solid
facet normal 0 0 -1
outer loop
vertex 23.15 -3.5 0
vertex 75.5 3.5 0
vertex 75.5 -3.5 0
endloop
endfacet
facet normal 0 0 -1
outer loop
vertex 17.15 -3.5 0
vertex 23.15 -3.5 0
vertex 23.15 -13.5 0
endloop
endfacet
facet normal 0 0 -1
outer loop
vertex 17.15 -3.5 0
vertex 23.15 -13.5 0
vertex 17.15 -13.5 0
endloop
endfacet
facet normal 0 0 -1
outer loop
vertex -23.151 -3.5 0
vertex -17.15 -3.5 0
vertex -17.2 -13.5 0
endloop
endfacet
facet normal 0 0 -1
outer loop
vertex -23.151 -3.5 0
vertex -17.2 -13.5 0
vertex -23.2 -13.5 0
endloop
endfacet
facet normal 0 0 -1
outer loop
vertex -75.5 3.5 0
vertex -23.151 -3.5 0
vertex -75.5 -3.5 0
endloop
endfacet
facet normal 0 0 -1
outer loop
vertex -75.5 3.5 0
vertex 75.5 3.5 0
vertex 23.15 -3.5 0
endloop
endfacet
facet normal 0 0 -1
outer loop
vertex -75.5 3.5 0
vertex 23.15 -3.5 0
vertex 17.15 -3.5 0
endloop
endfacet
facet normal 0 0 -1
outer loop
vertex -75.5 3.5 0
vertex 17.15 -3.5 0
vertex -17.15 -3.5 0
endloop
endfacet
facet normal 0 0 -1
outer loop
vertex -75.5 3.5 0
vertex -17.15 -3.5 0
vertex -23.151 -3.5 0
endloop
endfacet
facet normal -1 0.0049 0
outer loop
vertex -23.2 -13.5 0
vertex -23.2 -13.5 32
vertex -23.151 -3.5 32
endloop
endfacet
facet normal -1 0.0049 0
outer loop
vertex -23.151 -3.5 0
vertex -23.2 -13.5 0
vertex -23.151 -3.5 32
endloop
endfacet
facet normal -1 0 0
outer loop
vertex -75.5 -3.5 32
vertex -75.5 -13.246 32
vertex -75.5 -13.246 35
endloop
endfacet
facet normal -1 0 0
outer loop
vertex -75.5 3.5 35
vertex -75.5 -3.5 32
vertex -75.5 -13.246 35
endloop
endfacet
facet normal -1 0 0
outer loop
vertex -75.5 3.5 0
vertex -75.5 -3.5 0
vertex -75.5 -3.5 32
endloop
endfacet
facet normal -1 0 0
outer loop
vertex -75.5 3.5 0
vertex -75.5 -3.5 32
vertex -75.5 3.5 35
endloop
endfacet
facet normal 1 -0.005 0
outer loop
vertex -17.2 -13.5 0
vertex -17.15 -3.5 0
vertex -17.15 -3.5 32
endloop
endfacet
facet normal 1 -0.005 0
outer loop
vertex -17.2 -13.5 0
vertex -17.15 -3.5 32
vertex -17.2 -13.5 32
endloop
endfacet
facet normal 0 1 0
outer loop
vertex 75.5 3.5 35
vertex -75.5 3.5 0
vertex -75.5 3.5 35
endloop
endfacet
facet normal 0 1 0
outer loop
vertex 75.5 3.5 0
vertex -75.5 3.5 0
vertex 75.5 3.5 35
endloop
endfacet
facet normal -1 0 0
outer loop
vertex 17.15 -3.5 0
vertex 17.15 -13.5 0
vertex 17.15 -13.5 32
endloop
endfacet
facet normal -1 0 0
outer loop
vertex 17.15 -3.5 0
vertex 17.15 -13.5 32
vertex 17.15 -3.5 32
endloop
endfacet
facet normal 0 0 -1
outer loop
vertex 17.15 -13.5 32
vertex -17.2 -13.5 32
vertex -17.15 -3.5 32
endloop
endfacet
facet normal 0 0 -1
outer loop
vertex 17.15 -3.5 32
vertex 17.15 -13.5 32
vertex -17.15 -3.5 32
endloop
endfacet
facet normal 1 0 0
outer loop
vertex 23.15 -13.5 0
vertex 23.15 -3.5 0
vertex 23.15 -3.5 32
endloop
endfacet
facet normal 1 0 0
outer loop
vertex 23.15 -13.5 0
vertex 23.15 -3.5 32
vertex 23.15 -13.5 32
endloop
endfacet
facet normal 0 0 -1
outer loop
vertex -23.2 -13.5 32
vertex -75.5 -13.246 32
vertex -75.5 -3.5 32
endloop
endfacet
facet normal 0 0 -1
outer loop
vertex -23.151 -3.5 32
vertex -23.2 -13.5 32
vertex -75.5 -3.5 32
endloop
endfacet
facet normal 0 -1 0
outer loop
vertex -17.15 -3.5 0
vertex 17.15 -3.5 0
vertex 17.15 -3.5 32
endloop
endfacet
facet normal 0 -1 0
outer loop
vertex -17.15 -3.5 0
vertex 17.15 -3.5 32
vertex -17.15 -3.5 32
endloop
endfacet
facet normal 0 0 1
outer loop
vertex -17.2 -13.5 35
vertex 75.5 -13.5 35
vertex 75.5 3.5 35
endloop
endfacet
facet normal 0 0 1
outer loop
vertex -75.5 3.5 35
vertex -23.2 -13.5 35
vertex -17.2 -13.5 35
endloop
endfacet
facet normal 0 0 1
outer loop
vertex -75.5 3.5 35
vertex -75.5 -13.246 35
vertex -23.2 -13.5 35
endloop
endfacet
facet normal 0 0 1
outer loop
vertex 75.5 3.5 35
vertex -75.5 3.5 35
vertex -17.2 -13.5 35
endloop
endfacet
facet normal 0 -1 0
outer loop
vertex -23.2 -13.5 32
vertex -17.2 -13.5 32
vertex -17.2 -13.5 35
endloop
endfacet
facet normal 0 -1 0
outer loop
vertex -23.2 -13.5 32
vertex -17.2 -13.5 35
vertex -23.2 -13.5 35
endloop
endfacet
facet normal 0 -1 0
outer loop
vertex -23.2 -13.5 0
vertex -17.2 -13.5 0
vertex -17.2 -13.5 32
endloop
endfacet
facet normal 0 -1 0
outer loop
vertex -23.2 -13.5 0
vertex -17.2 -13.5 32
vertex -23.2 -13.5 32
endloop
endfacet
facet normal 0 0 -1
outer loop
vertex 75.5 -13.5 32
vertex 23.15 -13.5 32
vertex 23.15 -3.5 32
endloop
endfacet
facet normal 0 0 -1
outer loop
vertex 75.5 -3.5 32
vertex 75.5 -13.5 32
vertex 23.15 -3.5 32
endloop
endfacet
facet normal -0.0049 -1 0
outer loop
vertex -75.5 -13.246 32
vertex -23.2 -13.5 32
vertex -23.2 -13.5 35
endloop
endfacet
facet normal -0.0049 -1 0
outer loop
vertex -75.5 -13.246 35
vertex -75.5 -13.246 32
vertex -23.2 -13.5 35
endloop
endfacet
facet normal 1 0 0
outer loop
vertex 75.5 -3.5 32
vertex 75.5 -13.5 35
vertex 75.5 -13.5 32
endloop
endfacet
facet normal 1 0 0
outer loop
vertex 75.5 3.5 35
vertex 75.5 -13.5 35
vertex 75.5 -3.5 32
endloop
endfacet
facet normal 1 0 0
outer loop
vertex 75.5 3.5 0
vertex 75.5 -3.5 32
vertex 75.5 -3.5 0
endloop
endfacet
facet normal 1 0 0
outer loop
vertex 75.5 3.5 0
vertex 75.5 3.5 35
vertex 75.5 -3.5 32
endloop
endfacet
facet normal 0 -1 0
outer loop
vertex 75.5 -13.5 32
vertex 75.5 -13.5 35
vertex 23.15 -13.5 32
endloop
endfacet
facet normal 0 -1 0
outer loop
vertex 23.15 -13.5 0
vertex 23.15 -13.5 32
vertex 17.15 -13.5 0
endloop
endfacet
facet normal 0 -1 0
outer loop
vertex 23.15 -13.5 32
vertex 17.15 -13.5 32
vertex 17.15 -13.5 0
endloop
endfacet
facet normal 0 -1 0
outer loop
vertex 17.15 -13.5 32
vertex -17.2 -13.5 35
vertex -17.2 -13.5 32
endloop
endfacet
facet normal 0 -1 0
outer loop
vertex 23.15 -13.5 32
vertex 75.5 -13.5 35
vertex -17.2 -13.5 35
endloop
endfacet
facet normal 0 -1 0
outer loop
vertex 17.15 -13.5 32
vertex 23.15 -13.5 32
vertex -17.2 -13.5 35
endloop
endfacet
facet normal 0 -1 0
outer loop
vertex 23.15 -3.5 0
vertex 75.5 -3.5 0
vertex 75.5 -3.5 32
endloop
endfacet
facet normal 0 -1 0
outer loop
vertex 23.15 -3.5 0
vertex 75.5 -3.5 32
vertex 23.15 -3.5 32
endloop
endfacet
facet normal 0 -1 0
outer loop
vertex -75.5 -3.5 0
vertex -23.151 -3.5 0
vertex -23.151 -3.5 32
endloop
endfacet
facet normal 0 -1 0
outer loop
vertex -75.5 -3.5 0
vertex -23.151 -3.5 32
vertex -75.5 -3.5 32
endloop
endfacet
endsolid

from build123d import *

# Parameters (mm, degrees)
BOSS_EXTRUDE1_DEPTH = 35
BOSS_EXTRUDE2_REACH = 94.65
SKETCH5_W           = 3
SKETCH5_H           = 10
BOSS_EXTRUDE3_REACH = 54.382
SKETCH6_W           = 3
SKETCH6_H           = 10.000117819
SKETCH7_W           = 3
SKETCH7_H           = 10
BOSS_EXTRUDE4_DEPTH = 52.35


with BuildPart() as part:
    # Sketch1 → Boss-Extrude1 (new body)
    with BuildSketch(Plane.XY):
        Polygon((-75.5, 3.5), (75.5, 3.5), (75.5, -3.5), (23.15, -3.5), (23.15, -13.5), (17.15, -13.5), (17.15, -3.5), (-17.15, -3.5), (-17.2, -13.5), (-23.199999999, -13.499882182), (-23.151457837, -3.5), (-75.5, -3.5), align=None)
    extrude(amount=BOSS_EXTRUDE1_DEPTH)

    # Boss-Extrude2: up to this face of the body (flat: up to its plane)
    boss_extrude2_end = Plane(part.part.faces().sort_by_distance((-17.175, -8.5, 17.5))[0])
    # Sketch5 → Boss-Extrude2 (add, up to the picked face)
    with BuildSketch(Plane.ZY.offset(-17.15), mode=Mode.PRIVATE) as boss_extrude2_sk1:
        with Locations((33.5, -8.5)):
            Rectangle(SKETCH5_W, SKETCH5_H)
    boss_extrude2_tool1 = split(extrude(boss_extrude2_sk1.sketch, amount=BOSS_EXTRUDE2_REACH, mode=Mode.PRIVATE), bisect_by=boss_extrude2_end, keep=Keep.BOTH, mode=Mode.PRIVATE)
    add(boss_extrude2_tool1.solids().sort_by_distance((17.15, -8.5, 33.5))[0])

    # Boss-Extrude3: up to this face of the body (flat: up to its plane)
    boss_extrude3_end = Plane(part.part.faces().sort_by_distance((-75.5, 0, 17.5))[0])
    # Sketch6 → Boss-Extrude3 (add, up to the picked face)
    with BuildSketch(Plane(origin=(-23.133922754, 0.112298384, 0), x_dir=(0, 0, 1), z_dir=(-0.999988218, 0.004854216, 0)), mode=Mode.PRIVATE) as boss_extrude3_sk1:
        with Locations((33.5, -8.612399854)):
            Rectangle(SKETCH6_W, SKETCH6_H)
    boss_extrude3_tool1 = split(extrude(boss_extrude3_sk1.sketch, amount=BOSS_EXTRUDE3_REACH, mode=Mode.PRIVATE), bisect_by=boss_extrude3_end, keep=Keep.BOTH, mode=Mode.PRIVATE)
    add(boss_extrude3_tool1.solids().sort_by_distance((-23.175729, -8.5, 33.5))[0])

    # Sketch7 → Boss-Extrude4 (add)
    with BuildSketch(Plane(origin=(23.15, 0, 0), x_dir=(0, 0, -1), z_dir=(1, 0, 0))):
        with Locations((-33.5, -8.5)):
            Rectangle(SKETCH7_W, SKETCH7_H)
    extrude(amount=BOSS_EXTRUDE4_DEPTH)


solid = part.part
